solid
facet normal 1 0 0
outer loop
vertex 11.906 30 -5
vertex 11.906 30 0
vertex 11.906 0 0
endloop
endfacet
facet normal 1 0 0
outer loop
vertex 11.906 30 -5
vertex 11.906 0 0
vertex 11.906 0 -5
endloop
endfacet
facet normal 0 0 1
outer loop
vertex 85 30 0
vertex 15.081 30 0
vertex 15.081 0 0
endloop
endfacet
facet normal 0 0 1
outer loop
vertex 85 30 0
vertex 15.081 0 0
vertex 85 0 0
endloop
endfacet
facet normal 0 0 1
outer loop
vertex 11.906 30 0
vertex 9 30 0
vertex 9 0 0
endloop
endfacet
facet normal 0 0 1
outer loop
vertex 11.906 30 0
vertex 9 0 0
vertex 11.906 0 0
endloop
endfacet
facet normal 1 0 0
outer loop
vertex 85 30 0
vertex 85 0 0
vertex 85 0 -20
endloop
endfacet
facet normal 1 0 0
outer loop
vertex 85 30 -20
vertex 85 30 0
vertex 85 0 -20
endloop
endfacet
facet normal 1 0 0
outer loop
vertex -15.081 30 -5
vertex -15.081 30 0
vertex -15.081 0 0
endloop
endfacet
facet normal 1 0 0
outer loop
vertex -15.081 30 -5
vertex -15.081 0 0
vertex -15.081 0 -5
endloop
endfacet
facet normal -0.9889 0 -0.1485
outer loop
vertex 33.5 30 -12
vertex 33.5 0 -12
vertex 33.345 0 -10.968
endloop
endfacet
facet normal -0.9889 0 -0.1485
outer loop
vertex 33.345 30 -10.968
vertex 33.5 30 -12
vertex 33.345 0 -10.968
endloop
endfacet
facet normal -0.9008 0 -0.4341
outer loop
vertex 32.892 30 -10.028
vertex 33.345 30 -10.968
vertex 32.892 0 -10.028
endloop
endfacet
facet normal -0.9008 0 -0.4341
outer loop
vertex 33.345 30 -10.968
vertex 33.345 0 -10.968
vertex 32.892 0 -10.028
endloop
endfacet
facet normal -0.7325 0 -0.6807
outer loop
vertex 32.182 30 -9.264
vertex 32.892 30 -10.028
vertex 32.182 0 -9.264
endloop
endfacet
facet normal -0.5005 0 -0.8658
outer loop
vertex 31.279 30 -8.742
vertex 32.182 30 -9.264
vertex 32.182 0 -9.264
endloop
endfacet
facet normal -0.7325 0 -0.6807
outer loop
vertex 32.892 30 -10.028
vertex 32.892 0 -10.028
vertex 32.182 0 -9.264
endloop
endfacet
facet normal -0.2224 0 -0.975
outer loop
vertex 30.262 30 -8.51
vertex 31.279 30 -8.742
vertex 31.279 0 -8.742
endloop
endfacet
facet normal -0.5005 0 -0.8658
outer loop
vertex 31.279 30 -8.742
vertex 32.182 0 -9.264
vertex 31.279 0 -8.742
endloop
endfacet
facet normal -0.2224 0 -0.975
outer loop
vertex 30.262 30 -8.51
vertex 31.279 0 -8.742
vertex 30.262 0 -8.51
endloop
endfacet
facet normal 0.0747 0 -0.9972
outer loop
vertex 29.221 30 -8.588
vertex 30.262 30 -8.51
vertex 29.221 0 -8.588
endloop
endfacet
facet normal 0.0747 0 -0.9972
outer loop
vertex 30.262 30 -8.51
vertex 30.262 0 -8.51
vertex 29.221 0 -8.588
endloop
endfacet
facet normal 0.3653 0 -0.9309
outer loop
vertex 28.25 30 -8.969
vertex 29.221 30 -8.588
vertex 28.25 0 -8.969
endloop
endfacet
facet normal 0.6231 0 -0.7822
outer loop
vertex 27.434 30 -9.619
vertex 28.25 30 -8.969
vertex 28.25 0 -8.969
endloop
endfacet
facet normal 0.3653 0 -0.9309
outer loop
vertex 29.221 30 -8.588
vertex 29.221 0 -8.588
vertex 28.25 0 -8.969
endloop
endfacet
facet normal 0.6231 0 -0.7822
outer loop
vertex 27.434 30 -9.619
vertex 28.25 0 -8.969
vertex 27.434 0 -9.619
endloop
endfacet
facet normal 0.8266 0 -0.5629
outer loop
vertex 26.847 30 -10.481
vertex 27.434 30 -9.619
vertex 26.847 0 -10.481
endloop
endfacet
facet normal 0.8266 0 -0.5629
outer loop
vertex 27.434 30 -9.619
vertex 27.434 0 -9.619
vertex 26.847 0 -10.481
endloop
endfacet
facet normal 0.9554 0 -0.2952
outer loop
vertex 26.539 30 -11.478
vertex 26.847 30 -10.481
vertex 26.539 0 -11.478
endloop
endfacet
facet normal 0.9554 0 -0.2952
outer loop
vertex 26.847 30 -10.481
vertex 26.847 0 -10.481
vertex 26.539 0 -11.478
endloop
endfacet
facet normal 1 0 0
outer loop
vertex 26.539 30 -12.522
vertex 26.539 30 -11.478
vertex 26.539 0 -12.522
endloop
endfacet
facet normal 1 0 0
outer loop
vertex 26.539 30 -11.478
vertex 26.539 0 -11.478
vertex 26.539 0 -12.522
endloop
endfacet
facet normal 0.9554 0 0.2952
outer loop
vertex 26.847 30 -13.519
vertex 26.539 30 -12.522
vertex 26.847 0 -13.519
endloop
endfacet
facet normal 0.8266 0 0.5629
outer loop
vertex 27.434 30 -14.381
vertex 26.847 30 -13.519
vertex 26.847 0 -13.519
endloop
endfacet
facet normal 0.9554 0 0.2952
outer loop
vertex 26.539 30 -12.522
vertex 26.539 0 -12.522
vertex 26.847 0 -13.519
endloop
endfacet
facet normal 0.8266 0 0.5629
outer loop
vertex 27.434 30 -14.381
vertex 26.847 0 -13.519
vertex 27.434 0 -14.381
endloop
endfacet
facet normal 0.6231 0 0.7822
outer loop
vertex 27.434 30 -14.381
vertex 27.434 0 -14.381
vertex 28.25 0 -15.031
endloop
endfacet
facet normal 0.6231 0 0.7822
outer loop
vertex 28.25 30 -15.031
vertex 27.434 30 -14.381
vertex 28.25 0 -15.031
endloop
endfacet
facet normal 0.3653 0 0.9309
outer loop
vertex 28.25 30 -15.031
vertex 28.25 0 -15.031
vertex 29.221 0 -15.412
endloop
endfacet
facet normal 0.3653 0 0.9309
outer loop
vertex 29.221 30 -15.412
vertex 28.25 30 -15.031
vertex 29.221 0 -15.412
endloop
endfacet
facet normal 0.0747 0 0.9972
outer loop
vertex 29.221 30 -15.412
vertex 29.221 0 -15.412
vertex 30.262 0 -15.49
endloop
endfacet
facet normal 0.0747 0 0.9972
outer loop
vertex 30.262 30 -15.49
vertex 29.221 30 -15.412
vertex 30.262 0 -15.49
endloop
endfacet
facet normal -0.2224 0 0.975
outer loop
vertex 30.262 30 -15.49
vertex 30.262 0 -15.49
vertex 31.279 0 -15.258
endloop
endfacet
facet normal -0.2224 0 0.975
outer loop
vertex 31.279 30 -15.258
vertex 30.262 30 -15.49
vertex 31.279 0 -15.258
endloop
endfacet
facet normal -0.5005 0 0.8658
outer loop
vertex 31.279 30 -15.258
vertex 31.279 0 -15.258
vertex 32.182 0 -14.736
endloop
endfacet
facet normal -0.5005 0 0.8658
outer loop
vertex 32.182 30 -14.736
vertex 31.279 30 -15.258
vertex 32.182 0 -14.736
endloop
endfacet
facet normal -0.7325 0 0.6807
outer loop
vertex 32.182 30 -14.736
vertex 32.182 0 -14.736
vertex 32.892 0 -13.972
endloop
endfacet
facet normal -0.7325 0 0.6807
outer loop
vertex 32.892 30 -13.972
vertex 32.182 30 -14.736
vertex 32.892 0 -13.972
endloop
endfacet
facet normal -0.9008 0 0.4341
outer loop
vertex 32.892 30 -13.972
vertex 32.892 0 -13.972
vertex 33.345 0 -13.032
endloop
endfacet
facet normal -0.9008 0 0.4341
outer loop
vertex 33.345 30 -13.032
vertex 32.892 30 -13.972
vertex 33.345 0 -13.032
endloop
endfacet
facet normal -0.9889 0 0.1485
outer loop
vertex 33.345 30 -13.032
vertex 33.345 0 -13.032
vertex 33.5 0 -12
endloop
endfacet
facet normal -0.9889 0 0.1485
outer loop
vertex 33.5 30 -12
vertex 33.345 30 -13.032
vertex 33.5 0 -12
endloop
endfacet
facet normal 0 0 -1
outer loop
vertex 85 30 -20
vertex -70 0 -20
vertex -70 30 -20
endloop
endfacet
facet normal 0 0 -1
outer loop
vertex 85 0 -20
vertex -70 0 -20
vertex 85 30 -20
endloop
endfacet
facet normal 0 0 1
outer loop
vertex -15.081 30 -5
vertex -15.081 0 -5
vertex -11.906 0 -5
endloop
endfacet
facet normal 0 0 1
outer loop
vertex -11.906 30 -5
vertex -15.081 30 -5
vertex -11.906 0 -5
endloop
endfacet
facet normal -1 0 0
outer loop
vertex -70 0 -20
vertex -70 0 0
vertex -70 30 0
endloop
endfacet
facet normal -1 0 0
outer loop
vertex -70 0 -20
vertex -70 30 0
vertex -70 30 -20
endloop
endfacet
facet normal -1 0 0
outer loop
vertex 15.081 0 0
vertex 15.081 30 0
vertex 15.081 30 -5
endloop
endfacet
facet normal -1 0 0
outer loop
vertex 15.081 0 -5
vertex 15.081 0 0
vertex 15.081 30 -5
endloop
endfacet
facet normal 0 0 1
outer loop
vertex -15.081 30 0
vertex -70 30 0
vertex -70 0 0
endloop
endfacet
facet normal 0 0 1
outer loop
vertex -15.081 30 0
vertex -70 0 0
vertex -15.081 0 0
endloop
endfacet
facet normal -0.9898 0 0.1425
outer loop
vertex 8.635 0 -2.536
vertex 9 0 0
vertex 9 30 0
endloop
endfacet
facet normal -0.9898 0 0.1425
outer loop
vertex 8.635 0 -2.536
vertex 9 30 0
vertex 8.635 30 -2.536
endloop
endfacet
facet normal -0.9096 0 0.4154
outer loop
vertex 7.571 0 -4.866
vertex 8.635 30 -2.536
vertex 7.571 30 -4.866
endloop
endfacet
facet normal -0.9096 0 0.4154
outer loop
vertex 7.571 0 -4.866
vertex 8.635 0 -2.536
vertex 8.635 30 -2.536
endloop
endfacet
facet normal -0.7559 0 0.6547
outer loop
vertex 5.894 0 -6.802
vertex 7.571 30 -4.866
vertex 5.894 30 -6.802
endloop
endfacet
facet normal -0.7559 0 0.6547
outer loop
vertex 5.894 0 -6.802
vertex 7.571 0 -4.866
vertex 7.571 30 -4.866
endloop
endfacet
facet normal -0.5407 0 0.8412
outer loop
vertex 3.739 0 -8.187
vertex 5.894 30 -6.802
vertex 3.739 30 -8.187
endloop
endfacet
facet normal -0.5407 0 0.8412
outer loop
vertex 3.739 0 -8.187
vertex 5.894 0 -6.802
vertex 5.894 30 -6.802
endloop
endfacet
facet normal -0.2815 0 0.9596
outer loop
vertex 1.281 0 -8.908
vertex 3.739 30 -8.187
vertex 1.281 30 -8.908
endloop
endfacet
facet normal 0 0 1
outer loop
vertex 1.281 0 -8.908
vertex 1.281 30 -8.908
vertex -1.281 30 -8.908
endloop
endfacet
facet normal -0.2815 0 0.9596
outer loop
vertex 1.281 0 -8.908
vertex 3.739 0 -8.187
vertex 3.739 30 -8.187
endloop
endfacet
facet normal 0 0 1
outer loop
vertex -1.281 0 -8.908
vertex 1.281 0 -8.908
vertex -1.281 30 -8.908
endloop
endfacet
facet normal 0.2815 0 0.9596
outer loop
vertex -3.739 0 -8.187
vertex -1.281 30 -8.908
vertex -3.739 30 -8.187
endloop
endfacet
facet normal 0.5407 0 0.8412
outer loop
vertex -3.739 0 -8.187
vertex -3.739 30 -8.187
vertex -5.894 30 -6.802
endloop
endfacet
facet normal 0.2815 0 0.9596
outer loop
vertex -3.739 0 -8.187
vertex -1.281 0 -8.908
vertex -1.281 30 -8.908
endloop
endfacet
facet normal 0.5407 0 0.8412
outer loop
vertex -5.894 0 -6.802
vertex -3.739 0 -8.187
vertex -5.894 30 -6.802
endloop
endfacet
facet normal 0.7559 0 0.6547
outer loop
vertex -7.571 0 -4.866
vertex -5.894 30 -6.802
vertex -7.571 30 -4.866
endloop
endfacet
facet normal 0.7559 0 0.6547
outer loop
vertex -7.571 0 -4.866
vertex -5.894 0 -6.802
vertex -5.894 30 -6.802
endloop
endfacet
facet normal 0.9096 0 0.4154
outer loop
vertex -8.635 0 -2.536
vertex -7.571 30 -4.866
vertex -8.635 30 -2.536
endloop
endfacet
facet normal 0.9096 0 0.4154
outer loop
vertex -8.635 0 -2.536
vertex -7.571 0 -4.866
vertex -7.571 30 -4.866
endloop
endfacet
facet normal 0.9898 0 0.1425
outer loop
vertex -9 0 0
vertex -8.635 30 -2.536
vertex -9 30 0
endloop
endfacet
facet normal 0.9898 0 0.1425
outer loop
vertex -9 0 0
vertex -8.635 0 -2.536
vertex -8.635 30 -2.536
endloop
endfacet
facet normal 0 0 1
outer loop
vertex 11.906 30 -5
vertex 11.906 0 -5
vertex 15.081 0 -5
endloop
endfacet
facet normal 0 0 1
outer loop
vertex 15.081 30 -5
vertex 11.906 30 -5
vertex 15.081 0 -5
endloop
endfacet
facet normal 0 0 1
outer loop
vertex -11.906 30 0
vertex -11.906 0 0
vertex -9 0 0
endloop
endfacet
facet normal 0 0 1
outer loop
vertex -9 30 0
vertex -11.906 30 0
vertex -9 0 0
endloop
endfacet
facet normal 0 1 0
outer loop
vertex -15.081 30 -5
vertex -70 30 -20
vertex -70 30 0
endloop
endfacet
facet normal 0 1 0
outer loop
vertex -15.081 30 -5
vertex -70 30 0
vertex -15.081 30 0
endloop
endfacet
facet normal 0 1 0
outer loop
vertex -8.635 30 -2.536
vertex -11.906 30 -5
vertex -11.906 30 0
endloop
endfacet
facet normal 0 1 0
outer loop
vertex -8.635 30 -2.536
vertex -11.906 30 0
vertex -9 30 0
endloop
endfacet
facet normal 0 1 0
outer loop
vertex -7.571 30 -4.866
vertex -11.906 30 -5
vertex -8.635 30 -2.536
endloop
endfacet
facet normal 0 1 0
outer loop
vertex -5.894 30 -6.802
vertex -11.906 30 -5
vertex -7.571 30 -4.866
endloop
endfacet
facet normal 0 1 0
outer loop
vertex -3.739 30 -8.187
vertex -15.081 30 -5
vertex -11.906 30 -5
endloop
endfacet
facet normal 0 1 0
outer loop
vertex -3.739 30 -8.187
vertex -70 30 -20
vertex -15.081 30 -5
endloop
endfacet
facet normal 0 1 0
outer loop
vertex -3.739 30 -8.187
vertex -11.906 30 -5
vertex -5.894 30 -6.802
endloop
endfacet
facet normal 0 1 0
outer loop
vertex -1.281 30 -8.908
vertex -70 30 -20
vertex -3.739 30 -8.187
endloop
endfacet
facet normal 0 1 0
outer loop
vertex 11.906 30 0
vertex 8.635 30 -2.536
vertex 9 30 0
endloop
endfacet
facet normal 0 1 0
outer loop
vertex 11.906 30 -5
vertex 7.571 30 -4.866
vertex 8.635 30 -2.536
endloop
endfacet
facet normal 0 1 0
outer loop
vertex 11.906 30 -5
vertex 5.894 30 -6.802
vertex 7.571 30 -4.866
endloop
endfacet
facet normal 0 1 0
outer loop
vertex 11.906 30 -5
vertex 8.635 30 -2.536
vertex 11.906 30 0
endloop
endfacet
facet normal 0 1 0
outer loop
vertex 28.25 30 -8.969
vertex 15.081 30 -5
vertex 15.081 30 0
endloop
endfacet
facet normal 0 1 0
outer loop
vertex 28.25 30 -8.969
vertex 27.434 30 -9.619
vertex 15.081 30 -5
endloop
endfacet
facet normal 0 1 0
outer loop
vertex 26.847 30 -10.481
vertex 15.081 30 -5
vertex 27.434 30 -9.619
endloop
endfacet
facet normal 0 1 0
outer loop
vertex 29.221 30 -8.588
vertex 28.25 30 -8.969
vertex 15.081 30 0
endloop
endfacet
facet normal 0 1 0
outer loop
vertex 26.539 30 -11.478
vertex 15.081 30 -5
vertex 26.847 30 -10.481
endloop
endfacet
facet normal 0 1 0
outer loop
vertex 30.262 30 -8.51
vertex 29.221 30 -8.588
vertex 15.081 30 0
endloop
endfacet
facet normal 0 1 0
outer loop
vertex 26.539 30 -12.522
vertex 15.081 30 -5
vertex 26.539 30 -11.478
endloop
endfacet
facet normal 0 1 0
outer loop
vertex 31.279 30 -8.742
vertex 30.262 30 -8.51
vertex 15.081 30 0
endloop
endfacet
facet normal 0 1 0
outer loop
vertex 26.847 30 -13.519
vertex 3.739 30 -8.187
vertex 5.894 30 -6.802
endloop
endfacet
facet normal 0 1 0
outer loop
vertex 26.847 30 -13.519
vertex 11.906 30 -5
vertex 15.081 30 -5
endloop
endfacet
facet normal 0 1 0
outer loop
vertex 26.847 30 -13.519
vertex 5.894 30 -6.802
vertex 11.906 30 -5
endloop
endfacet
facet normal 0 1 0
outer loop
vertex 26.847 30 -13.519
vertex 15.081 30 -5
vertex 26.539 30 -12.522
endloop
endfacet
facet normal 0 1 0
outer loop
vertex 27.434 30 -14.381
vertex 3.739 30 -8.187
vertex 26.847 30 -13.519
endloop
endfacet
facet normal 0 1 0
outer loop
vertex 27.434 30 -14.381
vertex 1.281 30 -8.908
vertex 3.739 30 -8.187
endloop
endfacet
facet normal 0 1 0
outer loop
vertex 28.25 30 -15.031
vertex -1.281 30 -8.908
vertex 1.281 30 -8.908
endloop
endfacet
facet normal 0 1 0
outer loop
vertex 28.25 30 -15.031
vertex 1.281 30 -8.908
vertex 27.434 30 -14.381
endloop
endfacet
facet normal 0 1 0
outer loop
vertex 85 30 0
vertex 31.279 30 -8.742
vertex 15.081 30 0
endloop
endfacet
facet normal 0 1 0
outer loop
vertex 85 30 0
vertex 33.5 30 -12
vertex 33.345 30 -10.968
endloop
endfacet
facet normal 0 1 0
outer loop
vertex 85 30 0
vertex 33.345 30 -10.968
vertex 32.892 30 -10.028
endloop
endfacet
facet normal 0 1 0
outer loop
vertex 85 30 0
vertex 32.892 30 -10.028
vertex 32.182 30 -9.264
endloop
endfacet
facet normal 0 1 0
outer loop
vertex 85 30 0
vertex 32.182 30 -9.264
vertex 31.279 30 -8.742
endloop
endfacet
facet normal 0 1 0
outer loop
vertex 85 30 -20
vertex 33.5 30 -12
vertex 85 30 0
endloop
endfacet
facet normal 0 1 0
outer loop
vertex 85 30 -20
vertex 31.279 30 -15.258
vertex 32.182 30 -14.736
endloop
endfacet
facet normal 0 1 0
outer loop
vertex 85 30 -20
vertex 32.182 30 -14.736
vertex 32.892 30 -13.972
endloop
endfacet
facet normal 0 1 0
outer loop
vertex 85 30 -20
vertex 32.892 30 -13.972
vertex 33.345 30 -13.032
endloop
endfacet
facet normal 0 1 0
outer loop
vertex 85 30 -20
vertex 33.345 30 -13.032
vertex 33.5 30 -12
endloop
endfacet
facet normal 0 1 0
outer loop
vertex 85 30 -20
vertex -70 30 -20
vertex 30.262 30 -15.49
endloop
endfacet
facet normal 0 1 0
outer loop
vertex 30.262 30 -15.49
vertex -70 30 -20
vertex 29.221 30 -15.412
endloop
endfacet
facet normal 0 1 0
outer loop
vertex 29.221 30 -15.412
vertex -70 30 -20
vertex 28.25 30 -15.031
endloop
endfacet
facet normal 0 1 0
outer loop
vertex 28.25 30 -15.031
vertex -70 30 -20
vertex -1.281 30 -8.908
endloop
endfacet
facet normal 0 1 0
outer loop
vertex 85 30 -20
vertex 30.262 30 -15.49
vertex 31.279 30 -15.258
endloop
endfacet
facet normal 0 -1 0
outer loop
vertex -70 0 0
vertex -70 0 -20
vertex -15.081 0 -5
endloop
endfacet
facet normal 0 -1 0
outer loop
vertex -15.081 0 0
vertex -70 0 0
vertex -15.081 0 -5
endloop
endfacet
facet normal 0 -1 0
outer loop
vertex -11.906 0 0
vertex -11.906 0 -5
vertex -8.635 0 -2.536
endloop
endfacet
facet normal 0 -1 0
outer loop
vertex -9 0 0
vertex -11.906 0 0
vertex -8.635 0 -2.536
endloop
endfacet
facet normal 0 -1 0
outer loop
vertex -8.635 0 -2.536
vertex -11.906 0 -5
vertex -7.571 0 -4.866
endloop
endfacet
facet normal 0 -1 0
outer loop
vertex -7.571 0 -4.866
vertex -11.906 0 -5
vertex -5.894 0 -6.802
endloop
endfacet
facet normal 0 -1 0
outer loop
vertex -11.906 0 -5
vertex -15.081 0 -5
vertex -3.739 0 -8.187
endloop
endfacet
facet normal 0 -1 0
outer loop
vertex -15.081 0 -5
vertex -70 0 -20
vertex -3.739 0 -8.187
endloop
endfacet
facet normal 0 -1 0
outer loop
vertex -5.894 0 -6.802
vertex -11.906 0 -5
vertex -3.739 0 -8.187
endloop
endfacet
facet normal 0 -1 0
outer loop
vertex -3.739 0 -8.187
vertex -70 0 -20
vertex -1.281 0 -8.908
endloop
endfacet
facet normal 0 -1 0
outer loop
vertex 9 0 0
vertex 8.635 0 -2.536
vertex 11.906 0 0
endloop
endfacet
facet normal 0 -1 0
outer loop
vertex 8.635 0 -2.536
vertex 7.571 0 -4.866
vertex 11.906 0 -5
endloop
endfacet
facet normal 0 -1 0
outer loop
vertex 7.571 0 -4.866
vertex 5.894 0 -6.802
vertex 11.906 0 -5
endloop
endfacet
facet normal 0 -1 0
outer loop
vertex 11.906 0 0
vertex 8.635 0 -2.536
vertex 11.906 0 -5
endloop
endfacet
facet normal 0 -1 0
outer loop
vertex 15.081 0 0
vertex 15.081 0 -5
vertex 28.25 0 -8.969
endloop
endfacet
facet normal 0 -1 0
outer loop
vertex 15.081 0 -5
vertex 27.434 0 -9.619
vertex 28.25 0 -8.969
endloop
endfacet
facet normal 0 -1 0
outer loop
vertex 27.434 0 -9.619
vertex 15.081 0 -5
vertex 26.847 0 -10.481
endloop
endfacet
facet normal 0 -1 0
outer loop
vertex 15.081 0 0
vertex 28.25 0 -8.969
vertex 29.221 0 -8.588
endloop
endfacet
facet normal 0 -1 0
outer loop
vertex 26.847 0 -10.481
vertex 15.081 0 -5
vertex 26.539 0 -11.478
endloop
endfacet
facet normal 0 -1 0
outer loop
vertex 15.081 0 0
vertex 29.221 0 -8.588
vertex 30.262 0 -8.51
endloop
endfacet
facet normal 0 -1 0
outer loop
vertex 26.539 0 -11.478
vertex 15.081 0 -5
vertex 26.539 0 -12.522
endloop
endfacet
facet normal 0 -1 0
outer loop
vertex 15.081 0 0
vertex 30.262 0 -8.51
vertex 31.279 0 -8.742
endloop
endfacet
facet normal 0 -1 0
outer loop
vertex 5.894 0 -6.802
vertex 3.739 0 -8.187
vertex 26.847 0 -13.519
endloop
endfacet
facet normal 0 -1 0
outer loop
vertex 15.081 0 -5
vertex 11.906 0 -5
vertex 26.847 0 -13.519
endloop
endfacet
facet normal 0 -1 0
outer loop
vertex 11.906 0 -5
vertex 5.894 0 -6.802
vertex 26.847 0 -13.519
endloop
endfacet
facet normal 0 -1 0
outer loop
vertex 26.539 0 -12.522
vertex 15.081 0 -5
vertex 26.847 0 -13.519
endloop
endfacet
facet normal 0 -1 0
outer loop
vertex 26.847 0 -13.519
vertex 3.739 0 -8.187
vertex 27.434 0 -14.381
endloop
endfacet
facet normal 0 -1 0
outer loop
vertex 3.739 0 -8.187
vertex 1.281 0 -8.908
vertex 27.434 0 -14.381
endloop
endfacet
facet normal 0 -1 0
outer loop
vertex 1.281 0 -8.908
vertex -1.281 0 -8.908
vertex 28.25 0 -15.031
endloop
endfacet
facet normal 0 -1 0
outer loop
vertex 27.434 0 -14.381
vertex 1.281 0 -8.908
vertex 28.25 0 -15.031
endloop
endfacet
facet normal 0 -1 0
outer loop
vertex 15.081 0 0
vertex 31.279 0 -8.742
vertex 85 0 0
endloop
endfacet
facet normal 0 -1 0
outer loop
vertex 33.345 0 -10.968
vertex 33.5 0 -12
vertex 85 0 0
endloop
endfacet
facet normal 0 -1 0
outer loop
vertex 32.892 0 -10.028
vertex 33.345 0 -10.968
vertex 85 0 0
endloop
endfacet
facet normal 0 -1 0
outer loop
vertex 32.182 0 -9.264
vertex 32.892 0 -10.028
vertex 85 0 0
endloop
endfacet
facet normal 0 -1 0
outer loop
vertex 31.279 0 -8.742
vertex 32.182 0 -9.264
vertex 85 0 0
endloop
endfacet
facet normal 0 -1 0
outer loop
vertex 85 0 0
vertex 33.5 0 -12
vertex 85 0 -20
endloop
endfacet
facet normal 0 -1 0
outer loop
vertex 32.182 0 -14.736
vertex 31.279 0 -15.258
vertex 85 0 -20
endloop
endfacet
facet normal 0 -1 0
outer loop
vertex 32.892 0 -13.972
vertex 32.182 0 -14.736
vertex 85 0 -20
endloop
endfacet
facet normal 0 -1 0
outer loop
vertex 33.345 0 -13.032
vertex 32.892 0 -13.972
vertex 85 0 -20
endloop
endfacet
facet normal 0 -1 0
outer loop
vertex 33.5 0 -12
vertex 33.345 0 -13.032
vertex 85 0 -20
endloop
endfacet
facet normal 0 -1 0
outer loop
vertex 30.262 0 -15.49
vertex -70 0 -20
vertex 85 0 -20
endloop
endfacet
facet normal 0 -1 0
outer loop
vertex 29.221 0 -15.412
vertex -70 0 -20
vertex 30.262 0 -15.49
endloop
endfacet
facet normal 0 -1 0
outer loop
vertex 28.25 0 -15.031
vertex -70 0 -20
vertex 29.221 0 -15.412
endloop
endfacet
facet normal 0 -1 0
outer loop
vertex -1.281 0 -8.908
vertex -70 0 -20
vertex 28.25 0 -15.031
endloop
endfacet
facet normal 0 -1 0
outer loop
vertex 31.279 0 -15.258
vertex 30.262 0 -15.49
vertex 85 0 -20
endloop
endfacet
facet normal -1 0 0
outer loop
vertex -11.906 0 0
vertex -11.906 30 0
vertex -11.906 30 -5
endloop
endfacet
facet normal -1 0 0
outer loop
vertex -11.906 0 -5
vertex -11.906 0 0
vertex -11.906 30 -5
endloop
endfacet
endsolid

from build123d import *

# Parameters (mm, degrees)
SKETCH1_W           = 155
SKETCH1_H           = 40
SKETCH1_R           = 9
BOSS_EXTRUDE1_DEPTH = 30
SKETCH3_W           = 3.175
SKETCH3_H           = 10
CUT_EXTRUDE2_DEPTH  = 31
SKETCH2_W           = 155
SKETCH2_H           = 30
CUT_EXTRUDE1_DEPTH  = 21
SKETCH4_R           = 3.5
CUT_EXTRUDE3_DEPTH  = 31


with BuildPart() as part:
    # Sketch1 → Boss-Extrude1 (new body)
    with BuildSketch(Plane(origin=(0, 0, 0), x_dir=(1, 0, 0), z_dir=(0, 1, 0))):
        with Locations((7.5, 0)):
            Rectangle(SKETCH1_W, SKETCH1_H)
        Circle(SKETCH1_R, mode=Mode.SUBTRACT)
    extrude(amount=BOSS_EXTRUDE1_DEPTH)

    # Sketch3 → Cut-Extrude2 (cut, through all)
    with BuildSketch(Plane(origin=(0, 30, 0), x_dir=(1, 0, 0), z_dir=(0, 1, 0))):
        with Locations((-13.49375, 0)):
            Rectangle(SKETCH3_W, SKETCH3_H)
        with Locations((13.49375, 0)):
            Rectangle(SKETCH3_W, SKETCH3_H)
    extrude(amount=-CUT_EXTRUDE2_DEPTH, mode=Mode.SUBTRACT)

    # Sketch2 → Cut-Extrude1 (cut, through all)
    with BuildSketch(Plane.XY):
        with Locations((7.5, 15)):
            Rectangle(SKETCH2_W, SKETCH2_H)
    extrude(amount=CUT_EXTRUDE1_DEPTH, mode=Mode.SUBTRACT)

    # Sketch4 → Cut-Extrude3 (cut, through all)
    with BuildSketch(Plane.XZ):
        with Locations((30, -12)):
            Circle(SKETCH4_R)
    extrude(amount=-CUT_EXTRUDE3_DEPTH, mode=Mode.SUBTRACT)


solid = part.part
